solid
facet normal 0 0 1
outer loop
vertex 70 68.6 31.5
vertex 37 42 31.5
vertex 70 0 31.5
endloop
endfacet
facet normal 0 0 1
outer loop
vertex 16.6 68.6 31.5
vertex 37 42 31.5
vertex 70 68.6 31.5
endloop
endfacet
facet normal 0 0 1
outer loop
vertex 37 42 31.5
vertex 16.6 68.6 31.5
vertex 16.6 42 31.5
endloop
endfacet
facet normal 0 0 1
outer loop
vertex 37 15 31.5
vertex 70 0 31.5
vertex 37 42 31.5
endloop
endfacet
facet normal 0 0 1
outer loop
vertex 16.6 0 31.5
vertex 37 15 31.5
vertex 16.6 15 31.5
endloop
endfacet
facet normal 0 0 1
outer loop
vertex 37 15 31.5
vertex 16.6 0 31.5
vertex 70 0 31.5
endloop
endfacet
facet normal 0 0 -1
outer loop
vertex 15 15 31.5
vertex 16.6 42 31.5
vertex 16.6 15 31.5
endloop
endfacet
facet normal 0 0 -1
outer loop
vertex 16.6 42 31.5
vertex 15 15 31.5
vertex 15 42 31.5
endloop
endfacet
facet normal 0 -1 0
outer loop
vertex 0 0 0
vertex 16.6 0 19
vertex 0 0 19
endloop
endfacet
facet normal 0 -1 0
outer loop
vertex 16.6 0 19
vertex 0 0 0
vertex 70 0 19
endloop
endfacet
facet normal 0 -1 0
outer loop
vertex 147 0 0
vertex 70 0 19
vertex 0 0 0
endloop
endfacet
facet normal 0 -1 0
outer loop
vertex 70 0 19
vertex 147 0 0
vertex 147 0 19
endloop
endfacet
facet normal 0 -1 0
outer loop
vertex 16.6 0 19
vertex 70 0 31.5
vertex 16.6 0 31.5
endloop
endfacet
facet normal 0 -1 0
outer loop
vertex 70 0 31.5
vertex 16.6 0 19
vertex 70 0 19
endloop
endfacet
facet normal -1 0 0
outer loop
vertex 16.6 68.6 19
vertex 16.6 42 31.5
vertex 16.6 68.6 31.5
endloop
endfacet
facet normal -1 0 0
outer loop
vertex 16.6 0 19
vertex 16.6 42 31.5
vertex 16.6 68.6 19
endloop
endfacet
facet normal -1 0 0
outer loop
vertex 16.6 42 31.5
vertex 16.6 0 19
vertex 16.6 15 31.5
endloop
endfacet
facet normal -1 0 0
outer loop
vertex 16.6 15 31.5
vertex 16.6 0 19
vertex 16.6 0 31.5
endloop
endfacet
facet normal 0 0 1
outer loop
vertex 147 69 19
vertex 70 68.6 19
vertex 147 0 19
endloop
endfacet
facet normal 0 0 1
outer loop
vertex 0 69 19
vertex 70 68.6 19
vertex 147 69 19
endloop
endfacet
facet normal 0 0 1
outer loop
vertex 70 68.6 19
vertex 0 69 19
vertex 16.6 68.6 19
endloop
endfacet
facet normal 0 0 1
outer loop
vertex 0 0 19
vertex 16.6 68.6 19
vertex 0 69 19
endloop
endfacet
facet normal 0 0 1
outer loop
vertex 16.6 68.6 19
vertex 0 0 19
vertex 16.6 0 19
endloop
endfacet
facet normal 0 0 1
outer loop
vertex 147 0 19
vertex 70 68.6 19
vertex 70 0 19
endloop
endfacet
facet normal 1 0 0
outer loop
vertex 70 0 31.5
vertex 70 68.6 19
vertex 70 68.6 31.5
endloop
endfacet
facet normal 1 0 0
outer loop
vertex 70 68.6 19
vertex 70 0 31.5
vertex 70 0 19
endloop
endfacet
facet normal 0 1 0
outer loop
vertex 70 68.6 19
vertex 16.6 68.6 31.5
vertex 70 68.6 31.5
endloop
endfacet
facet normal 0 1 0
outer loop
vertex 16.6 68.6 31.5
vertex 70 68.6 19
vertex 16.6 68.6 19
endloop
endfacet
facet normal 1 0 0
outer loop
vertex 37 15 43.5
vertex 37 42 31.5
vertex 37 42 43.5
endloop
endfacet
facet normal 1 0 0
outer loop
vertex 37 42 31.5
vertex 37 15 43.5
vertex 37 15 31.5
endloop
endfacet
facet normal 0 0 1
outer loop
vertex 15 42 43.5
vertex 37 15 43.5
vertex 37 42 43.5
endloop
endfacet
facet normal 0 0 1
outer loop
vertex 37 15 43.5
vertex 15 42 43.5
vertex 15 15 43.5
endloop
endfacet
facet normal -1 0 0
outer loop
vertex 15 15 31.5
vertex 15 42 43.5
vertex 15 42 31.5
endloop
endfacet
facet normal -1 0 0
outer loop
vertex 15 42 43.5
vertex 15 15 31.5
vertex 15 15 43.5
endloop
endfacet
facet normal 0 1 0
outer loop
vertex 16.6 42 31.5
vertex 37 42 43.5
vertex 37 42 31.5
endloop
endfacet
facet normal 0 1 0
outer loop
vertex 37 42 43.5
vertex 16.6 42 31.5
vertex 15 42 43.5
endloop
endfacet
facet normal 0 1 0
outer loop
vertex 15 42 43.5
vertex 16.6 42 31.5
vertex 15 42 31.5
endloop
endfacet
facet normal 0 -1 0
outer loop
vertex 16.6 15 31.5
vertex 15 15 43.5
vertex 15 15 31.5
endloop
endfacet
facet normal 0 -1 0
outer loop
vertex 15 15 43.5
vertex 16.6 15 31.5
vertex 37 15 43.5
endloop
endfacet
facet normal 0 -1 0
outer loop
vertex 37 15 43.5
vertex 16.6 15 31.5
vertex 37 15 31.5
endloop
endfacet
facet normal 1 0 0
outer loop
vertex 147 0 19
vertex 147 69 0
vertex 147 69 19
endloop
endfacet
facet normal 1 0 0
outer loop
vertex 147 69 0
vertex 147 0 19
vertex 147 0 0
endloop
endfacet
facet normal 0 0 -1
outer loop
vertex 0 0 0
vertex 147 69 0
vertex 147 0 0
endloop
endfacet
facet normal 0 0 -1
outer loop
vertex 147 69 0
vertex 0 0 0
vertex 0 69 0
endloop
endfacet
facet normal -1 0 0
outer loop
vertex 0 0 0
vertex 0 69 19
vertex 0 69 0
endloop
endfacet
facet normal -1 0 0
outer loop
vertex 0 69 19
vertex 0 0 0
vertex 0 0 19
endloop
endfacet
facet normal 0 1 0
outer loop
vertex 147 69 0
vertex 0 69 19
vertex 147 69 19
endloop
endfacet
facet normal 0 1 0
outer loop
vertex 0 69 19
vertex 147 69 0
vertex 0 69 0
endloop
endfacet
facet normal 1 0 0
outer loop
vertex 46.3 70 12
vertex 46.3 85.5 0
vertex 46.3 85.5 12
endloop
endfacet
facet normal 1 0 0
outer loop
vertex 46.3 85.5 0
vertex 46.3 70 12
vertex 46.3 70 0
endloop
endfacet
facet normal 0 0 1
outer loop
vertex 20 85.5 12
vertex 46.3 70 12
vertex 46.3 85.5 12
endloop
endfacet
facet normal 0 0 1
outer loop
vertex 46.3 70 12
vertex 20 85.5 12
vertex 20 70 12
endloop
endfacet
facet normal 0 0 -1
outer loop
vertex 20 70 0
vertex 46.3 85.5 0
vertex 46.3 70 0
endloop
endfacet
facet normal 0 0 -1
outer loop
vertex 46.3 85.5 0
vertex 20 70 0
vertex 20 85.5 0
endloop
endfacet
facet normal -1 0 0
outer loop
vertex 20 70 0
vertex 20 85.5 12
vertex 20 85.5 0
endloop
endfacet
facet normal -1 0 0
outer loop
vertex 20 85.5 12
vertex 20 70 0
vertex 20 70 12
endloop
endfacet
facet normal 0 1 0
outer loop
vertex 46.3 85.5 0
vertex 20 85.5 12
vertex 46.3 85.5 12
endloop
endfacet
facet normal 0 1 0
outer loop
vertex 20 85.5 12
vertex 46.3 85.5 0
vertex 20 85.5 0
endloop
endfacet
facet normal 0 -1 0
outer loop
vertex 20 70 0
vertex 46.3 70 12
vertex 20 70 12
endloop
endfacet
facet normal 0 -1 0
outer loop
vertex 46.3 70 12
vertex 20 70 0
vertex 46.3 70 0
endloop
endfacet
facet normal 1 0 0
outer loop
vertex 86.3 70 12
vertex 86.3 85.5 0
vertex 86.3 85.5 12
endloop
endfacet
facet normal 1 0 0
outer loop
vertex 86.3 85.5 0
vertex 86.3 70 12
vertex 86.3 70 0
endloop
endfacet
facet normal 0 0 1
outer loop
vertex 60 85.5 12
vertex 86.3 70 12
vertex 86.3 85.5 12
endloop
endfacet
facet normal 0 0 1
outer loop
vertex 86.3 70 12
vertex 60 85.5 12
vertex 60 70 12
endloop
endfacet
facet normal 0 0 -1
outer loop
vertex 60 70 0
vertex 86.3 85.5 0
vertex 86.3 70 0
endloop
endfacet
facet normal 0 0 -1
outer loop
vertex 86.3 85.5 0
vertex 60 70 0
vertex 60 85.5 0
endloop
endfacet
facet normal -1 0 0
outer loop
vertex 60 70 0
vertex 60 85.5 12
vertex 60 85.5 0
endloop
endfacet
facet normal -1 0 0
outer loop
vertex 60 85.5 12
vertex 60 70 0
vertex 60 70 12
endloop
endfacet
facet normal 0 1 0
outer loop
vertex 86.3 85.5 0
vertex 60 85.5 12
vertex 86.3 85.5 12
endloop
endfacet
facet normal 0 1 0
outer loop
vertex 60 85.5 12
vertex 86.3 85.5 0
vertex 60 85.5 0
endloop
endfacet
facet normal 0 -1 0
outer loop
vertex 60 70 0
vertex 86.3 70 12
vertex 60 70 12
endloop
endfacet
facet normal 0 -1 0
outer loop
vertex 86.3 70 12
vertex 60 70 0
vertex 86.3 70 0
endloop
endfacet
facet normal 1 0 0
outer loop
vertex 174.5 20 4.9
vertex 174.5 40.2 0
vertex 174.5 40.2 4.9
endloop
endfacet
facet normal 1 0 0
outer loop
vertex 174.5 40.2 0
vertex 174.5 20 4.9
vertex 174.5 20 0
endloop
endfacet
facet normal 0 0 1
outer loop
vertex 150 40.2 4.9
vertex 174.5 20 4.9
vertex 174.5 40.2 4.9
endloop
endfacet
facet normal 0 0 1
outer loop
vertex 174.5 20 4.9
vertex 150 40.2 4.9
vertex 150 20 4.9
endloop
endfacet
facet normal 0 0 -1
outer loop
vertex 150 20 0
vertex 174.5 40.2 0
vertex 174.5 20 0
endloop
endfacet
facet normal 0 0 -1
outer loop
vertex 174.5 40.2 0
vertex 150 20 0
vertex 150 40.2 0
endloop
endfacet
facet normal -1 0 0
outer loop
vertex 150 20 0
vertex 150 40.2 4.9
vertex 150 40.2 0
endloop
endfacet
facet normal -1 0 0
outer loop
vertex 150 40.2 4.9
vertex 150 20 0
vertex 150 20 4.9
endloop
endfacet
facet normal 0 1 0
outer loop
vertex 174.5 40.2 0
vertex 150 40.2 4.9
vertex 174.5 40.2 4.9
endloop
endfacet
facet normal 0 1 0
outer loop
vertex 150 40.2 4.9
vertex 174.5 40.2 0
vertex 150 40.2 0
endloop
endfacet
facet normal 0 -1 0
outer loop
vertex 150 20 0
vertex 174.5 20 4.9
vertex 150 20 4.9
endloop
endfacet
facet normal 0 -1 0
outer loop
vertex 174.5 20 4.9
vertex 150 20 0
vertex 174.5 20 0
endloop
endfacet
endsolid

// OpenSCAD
module arduino(length = 68.6,width = 53.4,height = 12.5){
    cube([length,width,height]);
}
module servo(length = 22,width = 27,height = 12) {
    cube([length,width,height]);
}
module power_bank(length = 147,width = 69,height = 19){
    cube([length,width,height]);
}
module motor(length = 26.3,width = 15.5,height = 12){
    cube([length,width,height]);
}
module usb_c(length = 24.5,width = 20.2,height = 4.9){
    cube([length,width,height]);
}
translate([70,0,19]) rotate(90) arduino(68.6,53.4,12.5);

translate([15,15,31.5]) servo();

translate([0,0,0]) power_bank();

translate([20,70,0]) motor();

translate([60,70,0]) motor();

translate([150,20,0]) usb_c();
